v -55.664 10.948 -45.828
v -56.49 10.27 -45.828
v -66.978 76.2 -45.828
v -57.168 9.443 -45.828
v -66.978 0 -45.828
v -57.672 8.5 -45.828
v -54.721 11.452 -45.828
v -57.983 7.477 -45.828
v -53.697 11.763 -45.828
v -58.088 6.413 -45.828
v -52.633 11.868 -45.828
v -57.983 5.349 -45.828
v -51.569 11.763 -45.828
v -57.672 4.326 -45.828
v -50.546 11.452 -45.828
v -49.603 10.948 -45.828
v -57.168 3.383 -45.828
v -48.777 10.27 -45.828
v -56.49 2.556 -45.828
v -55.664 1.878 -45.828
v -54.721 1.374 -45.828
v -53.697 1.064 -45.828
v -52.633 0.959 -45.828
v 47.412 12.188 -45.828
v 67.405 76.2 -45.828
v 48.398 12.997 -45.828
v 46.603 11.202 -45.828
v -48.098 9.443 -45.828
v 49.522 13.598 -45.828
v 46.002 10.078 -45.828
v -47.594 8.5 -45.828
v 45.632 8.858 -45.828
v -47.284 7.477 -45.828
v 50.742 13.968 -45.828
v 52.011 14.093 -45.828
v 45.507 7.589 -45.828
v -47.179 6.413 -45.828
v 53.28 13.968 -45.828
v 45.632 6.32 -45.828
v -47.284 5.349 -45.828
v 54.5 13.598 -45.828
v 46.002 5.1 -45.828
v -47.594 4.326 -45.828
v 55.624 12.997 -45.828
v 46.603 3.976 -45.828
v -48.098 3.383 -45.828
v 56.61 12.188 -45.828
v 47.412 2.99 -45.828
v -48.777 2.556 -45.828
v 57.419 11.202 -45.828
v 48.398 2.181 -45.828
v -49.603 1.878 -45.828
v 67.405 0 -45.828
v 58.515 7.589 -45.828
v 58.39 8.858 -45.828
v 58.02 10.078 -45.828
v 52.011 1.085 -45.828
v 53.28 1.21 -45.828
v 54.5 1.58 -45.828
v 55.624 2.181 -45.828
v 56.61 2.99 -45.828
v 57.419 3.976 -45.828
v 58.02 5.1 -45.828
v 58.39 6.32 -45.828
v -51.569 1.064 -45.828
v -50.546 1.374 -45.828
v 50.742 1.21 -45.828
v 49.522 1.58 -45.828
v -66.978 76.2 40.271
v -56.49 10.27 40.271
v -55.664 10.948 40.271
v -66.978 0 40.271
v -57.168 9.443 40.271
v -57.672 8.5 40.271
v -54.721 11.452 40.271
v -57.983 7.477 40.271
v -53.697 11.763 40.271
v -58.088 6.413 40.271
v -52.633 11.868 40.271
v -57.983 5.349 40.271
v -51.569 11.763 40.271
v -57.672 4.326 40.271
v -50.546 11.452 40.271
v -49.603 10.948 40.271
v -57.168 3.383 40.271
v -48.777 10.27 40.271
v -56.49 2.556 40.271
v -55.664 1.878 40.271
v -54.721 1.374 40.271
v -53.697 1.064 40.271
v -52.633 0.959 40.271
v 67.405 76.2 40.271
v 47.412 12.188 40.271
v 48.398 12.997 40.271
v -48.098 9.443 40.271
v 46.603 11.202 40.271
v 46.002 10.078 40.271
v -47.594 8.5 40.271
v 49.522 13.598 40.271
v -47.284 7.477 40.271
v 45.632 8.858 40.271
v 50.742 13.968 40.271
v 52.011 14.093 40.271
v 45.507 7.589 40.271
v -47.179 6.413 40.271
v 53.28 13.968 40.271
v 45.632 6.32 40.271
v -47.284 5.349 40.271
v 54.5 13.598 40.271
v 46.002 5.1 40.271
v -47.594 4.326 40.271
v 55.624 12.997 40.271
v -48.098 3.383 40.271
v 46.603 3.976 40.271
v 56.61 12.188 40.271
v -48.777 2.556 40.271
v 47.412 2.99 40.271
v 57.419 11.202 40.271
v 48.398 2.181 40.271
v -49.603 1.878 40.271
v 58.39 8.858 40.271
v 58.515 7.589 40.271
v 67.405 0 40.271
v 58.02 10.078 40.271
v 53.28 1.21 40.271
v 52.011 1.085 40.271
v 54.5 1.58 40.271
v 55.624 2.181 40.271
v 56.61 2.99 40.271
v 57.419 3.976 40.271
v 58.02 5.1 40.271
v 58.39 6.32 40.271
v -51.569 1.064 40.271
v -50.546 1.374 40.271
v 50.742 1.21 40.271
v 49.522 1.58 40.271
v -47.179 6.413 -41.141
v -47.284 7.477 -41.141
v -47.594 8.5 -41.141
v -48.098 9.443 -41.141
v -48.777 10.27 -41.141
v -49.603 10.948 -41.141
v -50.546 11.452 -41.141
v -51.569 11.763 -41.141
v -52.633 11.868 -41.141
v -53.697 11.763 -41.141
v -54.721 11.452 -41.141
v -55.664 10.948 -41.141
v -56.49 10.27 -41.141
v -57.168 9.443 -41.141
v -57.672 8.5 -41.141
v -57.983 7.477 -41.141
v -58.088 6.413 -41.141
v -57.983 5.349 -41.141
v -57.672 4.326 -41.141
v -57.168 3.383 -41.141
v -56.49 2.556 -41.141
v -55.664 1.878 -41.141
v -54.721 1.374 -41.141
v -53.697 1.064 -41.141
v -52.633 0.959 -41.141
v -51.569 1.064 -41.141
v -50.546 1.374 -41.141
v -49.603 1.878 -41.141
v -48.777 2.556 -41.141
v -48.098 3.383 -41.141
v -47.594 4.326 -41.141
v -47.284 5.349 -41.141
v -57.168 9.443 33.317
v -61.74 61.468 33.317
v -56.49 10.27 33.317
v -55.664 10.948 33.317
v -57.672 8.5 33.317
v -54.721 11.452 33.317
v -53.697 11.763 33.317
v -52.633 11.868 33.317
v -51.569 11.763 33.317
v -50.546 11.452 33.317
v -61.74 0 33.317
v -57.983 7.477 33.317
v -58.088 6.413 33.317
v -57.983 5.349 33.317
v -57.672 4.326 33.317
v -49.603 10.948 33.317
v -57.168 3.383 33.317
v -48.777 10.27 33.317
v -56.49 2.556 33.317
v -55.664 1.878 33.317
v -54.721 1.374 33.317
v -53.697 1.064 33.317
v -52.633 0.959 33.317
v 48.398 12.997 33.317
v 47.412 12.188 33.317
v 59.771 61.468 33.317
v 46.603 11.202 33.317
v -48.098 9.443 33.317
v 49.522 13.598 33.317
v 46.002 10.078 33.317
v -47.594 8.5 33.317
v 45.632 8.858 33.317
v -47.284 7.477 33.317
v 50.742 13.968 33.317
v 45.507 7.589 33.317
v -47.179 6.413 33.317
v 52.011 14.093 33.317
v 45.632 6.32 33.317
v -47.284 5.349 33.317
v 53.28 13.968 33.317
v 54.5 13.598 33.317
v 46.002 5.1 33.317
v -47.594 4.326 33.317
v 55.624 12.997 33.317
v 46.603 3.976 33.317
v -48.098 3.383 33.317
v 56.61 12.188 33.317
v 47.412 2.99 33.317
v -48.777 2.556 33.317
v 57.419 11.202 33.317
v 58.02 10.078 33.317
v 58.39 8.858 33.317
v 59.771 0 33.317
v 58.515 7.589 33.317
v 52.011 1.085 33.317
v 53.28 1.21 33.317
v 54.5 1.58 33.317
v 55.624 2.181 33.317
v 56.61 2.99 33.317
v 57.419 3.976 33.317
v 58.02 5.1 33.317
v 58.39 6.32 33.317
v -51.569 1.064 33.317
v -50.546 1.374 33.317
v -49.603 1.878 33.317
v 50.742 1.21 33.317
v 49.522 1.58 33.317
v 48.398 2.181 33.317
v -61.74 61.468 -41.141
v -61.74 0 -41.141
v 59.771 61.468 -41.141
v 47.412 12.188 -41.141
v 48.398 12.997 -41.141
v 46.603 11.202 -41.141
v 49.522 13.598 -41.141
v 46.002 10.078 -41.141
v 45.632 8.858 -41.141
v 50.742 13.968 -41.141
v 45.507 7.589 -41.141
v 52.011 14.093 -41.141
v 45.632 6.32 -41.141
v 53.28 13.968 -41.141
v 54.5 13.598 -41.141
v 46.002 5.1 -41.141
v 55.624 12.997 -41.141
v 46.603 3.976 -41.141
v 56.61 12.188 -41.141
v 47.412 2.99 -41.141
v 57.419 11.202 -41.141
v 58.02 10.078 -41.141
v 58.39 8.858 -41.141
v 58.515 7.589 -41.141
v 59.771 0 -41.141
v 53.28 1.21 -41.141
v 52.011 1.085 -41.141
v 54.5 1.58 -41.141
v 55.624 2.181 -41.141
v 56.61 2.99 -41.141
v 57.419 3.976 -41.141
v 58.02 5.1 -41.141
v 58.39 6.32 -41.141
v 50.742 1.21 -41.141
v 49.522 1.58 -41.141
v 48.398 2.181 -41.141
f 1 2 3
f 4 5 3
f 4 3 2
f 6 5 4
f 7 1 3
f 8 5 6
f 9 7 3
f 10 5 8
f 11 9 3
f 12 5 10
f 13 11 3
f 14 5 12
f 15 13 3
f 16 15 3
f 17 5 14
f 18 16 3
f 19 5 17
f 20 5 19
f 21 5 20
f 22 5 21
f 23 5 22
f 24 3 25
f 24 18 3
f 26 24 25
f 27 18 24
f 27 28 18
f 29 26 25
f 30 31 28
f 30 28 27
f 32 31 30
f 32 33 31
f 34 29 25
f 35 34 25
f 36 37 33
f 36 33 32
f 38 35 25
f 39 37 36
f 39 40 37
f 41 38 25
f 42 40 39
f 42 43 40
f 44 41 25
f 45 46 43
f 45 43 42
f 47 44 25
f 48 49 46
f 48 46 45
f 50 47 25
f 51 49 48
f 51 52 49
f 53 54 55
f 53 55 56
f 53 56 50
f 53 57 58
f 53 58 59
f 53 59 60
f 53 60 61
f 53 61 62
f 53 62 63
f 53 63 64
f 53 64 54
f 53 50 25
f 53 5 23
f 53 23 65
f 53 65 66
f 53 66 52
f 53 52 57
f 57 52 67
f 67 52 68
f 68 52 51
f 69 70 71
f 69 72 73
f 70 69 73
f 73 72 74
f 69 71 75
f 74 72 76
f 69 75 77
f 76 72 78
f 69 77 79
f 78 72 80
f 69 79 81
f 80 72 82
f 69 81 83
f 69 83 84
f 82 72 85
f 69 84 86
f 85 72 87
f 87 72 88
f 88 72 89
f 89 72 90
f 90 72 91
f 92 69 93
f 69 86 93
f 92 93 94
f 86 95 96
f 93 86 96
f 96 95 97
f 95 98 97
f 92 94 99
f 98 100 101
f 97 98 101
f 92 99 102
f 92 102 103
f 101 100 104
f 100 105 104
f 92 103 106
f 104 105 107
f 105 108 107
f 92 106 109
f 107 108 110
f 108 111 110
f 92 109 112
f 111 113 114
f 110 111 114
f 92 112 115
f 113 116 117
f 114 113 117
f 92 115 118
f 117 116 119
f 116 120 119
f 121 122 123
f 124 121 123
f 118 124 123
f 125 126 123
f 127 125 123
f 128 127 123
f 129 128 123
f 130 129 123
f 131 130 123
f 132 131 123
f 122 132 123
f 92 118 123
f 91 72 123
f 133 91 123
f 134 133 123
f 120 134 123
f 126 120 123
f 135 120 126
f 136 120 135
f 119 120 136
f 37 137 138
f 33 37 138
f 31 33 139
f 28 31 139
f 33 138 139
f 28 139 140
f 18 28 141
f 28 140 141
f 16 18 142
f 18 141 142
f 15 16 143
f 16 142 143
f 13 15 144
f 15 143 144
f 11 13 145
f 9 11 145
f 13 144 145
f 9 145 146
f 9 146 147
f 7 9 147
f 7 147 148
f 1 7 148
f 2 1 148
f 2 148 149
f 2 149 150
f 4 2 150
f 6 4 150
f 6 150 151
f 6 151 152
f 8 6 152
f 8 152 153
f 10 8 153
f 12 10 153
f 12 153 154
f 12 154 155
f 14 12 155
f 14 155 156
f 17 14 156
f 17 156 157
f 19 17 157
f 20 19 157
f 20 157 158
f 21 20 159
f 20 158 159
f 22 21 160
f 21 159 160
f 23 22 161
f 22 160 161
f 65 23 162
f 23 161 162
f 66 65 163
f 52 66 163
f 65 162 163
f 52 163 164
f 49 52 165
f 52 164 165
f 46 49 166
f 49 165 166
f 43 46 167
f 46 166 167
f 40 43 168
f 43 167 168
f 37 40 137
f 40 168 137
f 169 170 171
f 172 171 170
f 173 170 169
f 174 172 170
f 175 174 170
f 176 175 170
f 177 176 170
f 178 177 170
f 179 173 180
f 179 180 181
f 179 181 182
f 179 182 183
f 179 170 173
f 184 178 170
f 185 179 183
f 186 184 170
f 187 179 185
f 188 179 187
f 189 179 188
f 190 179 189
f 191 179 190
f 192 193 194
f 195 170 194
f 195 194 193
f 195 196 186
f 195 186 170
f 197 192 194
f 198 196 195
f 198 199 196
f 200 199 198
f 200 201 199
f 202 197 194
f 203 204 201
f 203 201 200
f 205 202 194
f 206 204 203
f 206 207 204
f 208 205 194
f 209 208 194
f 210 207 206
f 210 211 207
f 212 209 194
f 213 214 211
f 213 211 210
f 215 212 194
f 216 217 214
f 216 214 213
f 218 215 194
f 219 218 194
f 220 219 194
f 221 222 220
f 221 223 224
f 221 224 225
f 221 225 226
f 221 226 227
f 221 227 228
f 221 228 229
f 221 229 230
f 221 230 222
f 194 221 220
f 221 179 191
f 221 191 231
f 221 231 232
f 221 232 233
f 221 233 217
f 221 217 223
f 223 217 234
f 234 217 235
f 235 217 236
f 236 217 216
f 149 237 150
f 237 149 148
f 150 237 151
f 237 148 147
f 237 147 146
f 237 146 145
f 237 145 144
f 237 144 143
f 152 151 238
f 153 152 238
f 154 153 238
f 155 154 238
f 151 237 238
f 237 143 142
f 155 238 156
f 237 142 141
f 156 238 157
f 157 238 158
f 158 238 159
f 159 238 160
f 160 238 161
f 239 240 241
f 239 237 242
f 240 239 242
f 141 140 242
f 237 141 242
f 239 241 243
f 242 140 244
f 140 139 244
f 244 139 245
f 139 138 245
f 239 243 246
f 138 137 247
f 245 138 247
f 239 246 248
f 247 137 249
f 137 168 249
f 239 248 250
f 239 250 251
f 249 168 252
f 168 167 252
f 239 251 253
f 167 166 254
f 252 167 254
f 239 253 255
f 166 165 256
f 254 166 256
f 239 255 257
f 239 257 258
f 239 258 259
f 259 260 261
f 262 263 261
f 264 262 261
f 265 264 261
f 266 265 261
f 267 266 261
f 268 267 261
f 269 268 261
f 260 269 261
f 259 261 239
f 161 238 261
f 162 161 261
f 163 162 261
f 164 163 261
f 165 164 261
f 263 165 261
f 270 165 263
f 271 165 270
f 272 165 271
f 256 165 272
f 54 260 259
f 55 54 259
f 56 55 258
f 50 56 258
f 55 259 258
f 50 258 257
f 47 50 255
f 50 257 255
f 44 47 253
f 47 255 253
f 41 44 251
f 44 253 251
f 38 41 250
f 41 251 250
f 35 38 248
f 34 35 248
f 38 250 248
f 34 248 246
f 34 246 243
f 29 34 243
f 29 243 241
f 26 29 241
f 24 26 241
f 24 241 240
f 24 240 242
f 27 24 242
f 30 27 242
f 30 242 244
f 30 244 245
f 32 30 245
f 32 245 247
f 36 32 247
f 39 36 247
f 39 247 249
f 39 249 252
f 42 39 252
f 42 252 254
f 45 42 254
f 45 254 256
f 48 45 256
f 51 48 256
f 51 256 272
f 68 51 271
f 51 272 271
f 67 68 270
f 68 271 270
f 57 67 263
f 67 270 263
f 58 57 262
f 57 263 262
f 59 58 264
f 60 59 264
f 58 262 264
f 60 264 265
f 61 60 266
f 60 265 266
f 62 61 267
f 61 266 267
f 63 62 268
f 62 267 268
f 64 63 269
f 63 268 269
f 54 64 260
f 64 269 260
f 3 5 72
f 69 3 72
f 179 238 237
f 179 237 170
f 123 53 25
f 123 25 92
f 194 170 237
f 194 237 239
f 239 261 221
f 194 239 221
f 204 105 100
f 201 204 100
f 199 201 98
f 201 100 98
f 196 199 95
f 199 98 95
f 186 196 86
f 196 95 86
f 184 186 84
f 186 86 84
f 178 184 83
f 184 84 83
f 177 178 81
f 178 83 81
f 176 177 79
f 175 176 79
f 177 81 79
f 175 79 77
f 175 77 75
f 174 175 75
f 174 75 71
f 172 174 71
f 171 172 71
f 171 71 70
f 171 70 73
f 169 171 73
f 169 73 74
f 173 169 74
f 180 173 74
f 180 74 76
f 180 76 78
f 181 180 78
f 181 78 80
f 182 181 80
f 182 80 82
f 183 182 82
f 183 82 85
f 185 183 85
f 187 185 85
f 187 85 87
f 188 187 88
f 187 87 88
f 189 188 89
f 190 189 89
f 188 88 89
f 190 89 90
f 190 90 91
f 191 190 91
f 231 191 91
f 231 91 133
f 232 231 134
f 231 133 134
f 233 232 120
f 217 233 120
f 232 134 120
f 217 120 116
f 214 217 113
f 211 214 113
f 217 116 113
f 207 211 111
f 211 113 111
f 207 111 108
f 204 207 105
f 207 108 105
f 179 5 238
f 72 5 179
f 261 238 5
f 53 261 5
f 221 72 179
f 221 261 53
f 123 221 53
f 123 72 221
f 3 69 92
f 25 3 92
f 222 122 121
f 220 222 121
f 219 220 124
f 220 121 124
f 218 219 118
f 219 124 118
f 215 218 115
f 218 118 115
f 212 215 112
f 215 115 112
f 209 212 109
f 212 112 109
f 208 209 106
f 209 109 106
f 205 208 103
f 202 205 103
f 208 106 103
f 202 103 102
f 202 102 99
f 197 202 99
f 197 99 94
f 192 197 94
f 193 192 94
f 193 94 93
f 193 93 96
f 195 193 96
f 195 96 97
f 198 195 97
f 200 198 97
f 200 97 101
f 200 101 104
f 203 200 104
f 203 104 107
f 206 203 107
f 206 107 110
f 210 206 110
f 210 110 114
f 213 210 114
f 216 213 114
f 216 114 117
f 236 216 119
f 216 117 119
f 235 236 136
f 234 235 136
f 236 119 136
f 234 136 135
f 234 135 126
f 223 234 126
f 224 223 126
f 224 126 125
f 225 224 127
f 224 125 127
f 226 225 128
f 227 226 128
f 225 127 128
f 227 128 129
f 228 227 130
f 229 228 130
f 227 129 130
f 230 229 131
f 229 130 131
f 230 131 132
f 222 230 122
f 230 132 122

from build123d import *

# Parameters (mm, degrees)
F0_W     = 134.382621
F0_H     = 86.09888
F1_DEPTH = 76.2
F2_W     = 121.511206
F2_H     = 74.4575
F3_DEPTH = 61.468
F4_R     = 5.454336
F4_R_2   = 6.504008
F5_DEPTH = 177.8


with BuildPart() as f1:
    # F0 (on Front) → F1 (new body)
    with BuildSketch(Plane.XZ):
        with Locations((0.213645, -2.778597)):
            Rectangle(F0_W, F0_H)
    extrude(amount=-F1_DEPTH)

    # F2 (on face) → F3 (cut)
    with BuildSketch(Plane.XZ):
        with Locations((-0.984143, -3.911963)):
            Rectangle(F2_W, F2_H)
    extrude(amount=-F3_DEPTH, mode=Mode.SUBTRACT)

    # F4 (on face) → F5 (cut)
    with BuildSketch(Plane.XY.offset(40.270843)):
        with Locations((-52.633329, 6.413179)):
            Circle(F4_R)
        with Locations((52.010948, 7.588945)):
            Circle(F4_R_2)
    extrude(amount=-F5_DEPTH, mode=Mode.SUBTRACT)


solid = f1.part
